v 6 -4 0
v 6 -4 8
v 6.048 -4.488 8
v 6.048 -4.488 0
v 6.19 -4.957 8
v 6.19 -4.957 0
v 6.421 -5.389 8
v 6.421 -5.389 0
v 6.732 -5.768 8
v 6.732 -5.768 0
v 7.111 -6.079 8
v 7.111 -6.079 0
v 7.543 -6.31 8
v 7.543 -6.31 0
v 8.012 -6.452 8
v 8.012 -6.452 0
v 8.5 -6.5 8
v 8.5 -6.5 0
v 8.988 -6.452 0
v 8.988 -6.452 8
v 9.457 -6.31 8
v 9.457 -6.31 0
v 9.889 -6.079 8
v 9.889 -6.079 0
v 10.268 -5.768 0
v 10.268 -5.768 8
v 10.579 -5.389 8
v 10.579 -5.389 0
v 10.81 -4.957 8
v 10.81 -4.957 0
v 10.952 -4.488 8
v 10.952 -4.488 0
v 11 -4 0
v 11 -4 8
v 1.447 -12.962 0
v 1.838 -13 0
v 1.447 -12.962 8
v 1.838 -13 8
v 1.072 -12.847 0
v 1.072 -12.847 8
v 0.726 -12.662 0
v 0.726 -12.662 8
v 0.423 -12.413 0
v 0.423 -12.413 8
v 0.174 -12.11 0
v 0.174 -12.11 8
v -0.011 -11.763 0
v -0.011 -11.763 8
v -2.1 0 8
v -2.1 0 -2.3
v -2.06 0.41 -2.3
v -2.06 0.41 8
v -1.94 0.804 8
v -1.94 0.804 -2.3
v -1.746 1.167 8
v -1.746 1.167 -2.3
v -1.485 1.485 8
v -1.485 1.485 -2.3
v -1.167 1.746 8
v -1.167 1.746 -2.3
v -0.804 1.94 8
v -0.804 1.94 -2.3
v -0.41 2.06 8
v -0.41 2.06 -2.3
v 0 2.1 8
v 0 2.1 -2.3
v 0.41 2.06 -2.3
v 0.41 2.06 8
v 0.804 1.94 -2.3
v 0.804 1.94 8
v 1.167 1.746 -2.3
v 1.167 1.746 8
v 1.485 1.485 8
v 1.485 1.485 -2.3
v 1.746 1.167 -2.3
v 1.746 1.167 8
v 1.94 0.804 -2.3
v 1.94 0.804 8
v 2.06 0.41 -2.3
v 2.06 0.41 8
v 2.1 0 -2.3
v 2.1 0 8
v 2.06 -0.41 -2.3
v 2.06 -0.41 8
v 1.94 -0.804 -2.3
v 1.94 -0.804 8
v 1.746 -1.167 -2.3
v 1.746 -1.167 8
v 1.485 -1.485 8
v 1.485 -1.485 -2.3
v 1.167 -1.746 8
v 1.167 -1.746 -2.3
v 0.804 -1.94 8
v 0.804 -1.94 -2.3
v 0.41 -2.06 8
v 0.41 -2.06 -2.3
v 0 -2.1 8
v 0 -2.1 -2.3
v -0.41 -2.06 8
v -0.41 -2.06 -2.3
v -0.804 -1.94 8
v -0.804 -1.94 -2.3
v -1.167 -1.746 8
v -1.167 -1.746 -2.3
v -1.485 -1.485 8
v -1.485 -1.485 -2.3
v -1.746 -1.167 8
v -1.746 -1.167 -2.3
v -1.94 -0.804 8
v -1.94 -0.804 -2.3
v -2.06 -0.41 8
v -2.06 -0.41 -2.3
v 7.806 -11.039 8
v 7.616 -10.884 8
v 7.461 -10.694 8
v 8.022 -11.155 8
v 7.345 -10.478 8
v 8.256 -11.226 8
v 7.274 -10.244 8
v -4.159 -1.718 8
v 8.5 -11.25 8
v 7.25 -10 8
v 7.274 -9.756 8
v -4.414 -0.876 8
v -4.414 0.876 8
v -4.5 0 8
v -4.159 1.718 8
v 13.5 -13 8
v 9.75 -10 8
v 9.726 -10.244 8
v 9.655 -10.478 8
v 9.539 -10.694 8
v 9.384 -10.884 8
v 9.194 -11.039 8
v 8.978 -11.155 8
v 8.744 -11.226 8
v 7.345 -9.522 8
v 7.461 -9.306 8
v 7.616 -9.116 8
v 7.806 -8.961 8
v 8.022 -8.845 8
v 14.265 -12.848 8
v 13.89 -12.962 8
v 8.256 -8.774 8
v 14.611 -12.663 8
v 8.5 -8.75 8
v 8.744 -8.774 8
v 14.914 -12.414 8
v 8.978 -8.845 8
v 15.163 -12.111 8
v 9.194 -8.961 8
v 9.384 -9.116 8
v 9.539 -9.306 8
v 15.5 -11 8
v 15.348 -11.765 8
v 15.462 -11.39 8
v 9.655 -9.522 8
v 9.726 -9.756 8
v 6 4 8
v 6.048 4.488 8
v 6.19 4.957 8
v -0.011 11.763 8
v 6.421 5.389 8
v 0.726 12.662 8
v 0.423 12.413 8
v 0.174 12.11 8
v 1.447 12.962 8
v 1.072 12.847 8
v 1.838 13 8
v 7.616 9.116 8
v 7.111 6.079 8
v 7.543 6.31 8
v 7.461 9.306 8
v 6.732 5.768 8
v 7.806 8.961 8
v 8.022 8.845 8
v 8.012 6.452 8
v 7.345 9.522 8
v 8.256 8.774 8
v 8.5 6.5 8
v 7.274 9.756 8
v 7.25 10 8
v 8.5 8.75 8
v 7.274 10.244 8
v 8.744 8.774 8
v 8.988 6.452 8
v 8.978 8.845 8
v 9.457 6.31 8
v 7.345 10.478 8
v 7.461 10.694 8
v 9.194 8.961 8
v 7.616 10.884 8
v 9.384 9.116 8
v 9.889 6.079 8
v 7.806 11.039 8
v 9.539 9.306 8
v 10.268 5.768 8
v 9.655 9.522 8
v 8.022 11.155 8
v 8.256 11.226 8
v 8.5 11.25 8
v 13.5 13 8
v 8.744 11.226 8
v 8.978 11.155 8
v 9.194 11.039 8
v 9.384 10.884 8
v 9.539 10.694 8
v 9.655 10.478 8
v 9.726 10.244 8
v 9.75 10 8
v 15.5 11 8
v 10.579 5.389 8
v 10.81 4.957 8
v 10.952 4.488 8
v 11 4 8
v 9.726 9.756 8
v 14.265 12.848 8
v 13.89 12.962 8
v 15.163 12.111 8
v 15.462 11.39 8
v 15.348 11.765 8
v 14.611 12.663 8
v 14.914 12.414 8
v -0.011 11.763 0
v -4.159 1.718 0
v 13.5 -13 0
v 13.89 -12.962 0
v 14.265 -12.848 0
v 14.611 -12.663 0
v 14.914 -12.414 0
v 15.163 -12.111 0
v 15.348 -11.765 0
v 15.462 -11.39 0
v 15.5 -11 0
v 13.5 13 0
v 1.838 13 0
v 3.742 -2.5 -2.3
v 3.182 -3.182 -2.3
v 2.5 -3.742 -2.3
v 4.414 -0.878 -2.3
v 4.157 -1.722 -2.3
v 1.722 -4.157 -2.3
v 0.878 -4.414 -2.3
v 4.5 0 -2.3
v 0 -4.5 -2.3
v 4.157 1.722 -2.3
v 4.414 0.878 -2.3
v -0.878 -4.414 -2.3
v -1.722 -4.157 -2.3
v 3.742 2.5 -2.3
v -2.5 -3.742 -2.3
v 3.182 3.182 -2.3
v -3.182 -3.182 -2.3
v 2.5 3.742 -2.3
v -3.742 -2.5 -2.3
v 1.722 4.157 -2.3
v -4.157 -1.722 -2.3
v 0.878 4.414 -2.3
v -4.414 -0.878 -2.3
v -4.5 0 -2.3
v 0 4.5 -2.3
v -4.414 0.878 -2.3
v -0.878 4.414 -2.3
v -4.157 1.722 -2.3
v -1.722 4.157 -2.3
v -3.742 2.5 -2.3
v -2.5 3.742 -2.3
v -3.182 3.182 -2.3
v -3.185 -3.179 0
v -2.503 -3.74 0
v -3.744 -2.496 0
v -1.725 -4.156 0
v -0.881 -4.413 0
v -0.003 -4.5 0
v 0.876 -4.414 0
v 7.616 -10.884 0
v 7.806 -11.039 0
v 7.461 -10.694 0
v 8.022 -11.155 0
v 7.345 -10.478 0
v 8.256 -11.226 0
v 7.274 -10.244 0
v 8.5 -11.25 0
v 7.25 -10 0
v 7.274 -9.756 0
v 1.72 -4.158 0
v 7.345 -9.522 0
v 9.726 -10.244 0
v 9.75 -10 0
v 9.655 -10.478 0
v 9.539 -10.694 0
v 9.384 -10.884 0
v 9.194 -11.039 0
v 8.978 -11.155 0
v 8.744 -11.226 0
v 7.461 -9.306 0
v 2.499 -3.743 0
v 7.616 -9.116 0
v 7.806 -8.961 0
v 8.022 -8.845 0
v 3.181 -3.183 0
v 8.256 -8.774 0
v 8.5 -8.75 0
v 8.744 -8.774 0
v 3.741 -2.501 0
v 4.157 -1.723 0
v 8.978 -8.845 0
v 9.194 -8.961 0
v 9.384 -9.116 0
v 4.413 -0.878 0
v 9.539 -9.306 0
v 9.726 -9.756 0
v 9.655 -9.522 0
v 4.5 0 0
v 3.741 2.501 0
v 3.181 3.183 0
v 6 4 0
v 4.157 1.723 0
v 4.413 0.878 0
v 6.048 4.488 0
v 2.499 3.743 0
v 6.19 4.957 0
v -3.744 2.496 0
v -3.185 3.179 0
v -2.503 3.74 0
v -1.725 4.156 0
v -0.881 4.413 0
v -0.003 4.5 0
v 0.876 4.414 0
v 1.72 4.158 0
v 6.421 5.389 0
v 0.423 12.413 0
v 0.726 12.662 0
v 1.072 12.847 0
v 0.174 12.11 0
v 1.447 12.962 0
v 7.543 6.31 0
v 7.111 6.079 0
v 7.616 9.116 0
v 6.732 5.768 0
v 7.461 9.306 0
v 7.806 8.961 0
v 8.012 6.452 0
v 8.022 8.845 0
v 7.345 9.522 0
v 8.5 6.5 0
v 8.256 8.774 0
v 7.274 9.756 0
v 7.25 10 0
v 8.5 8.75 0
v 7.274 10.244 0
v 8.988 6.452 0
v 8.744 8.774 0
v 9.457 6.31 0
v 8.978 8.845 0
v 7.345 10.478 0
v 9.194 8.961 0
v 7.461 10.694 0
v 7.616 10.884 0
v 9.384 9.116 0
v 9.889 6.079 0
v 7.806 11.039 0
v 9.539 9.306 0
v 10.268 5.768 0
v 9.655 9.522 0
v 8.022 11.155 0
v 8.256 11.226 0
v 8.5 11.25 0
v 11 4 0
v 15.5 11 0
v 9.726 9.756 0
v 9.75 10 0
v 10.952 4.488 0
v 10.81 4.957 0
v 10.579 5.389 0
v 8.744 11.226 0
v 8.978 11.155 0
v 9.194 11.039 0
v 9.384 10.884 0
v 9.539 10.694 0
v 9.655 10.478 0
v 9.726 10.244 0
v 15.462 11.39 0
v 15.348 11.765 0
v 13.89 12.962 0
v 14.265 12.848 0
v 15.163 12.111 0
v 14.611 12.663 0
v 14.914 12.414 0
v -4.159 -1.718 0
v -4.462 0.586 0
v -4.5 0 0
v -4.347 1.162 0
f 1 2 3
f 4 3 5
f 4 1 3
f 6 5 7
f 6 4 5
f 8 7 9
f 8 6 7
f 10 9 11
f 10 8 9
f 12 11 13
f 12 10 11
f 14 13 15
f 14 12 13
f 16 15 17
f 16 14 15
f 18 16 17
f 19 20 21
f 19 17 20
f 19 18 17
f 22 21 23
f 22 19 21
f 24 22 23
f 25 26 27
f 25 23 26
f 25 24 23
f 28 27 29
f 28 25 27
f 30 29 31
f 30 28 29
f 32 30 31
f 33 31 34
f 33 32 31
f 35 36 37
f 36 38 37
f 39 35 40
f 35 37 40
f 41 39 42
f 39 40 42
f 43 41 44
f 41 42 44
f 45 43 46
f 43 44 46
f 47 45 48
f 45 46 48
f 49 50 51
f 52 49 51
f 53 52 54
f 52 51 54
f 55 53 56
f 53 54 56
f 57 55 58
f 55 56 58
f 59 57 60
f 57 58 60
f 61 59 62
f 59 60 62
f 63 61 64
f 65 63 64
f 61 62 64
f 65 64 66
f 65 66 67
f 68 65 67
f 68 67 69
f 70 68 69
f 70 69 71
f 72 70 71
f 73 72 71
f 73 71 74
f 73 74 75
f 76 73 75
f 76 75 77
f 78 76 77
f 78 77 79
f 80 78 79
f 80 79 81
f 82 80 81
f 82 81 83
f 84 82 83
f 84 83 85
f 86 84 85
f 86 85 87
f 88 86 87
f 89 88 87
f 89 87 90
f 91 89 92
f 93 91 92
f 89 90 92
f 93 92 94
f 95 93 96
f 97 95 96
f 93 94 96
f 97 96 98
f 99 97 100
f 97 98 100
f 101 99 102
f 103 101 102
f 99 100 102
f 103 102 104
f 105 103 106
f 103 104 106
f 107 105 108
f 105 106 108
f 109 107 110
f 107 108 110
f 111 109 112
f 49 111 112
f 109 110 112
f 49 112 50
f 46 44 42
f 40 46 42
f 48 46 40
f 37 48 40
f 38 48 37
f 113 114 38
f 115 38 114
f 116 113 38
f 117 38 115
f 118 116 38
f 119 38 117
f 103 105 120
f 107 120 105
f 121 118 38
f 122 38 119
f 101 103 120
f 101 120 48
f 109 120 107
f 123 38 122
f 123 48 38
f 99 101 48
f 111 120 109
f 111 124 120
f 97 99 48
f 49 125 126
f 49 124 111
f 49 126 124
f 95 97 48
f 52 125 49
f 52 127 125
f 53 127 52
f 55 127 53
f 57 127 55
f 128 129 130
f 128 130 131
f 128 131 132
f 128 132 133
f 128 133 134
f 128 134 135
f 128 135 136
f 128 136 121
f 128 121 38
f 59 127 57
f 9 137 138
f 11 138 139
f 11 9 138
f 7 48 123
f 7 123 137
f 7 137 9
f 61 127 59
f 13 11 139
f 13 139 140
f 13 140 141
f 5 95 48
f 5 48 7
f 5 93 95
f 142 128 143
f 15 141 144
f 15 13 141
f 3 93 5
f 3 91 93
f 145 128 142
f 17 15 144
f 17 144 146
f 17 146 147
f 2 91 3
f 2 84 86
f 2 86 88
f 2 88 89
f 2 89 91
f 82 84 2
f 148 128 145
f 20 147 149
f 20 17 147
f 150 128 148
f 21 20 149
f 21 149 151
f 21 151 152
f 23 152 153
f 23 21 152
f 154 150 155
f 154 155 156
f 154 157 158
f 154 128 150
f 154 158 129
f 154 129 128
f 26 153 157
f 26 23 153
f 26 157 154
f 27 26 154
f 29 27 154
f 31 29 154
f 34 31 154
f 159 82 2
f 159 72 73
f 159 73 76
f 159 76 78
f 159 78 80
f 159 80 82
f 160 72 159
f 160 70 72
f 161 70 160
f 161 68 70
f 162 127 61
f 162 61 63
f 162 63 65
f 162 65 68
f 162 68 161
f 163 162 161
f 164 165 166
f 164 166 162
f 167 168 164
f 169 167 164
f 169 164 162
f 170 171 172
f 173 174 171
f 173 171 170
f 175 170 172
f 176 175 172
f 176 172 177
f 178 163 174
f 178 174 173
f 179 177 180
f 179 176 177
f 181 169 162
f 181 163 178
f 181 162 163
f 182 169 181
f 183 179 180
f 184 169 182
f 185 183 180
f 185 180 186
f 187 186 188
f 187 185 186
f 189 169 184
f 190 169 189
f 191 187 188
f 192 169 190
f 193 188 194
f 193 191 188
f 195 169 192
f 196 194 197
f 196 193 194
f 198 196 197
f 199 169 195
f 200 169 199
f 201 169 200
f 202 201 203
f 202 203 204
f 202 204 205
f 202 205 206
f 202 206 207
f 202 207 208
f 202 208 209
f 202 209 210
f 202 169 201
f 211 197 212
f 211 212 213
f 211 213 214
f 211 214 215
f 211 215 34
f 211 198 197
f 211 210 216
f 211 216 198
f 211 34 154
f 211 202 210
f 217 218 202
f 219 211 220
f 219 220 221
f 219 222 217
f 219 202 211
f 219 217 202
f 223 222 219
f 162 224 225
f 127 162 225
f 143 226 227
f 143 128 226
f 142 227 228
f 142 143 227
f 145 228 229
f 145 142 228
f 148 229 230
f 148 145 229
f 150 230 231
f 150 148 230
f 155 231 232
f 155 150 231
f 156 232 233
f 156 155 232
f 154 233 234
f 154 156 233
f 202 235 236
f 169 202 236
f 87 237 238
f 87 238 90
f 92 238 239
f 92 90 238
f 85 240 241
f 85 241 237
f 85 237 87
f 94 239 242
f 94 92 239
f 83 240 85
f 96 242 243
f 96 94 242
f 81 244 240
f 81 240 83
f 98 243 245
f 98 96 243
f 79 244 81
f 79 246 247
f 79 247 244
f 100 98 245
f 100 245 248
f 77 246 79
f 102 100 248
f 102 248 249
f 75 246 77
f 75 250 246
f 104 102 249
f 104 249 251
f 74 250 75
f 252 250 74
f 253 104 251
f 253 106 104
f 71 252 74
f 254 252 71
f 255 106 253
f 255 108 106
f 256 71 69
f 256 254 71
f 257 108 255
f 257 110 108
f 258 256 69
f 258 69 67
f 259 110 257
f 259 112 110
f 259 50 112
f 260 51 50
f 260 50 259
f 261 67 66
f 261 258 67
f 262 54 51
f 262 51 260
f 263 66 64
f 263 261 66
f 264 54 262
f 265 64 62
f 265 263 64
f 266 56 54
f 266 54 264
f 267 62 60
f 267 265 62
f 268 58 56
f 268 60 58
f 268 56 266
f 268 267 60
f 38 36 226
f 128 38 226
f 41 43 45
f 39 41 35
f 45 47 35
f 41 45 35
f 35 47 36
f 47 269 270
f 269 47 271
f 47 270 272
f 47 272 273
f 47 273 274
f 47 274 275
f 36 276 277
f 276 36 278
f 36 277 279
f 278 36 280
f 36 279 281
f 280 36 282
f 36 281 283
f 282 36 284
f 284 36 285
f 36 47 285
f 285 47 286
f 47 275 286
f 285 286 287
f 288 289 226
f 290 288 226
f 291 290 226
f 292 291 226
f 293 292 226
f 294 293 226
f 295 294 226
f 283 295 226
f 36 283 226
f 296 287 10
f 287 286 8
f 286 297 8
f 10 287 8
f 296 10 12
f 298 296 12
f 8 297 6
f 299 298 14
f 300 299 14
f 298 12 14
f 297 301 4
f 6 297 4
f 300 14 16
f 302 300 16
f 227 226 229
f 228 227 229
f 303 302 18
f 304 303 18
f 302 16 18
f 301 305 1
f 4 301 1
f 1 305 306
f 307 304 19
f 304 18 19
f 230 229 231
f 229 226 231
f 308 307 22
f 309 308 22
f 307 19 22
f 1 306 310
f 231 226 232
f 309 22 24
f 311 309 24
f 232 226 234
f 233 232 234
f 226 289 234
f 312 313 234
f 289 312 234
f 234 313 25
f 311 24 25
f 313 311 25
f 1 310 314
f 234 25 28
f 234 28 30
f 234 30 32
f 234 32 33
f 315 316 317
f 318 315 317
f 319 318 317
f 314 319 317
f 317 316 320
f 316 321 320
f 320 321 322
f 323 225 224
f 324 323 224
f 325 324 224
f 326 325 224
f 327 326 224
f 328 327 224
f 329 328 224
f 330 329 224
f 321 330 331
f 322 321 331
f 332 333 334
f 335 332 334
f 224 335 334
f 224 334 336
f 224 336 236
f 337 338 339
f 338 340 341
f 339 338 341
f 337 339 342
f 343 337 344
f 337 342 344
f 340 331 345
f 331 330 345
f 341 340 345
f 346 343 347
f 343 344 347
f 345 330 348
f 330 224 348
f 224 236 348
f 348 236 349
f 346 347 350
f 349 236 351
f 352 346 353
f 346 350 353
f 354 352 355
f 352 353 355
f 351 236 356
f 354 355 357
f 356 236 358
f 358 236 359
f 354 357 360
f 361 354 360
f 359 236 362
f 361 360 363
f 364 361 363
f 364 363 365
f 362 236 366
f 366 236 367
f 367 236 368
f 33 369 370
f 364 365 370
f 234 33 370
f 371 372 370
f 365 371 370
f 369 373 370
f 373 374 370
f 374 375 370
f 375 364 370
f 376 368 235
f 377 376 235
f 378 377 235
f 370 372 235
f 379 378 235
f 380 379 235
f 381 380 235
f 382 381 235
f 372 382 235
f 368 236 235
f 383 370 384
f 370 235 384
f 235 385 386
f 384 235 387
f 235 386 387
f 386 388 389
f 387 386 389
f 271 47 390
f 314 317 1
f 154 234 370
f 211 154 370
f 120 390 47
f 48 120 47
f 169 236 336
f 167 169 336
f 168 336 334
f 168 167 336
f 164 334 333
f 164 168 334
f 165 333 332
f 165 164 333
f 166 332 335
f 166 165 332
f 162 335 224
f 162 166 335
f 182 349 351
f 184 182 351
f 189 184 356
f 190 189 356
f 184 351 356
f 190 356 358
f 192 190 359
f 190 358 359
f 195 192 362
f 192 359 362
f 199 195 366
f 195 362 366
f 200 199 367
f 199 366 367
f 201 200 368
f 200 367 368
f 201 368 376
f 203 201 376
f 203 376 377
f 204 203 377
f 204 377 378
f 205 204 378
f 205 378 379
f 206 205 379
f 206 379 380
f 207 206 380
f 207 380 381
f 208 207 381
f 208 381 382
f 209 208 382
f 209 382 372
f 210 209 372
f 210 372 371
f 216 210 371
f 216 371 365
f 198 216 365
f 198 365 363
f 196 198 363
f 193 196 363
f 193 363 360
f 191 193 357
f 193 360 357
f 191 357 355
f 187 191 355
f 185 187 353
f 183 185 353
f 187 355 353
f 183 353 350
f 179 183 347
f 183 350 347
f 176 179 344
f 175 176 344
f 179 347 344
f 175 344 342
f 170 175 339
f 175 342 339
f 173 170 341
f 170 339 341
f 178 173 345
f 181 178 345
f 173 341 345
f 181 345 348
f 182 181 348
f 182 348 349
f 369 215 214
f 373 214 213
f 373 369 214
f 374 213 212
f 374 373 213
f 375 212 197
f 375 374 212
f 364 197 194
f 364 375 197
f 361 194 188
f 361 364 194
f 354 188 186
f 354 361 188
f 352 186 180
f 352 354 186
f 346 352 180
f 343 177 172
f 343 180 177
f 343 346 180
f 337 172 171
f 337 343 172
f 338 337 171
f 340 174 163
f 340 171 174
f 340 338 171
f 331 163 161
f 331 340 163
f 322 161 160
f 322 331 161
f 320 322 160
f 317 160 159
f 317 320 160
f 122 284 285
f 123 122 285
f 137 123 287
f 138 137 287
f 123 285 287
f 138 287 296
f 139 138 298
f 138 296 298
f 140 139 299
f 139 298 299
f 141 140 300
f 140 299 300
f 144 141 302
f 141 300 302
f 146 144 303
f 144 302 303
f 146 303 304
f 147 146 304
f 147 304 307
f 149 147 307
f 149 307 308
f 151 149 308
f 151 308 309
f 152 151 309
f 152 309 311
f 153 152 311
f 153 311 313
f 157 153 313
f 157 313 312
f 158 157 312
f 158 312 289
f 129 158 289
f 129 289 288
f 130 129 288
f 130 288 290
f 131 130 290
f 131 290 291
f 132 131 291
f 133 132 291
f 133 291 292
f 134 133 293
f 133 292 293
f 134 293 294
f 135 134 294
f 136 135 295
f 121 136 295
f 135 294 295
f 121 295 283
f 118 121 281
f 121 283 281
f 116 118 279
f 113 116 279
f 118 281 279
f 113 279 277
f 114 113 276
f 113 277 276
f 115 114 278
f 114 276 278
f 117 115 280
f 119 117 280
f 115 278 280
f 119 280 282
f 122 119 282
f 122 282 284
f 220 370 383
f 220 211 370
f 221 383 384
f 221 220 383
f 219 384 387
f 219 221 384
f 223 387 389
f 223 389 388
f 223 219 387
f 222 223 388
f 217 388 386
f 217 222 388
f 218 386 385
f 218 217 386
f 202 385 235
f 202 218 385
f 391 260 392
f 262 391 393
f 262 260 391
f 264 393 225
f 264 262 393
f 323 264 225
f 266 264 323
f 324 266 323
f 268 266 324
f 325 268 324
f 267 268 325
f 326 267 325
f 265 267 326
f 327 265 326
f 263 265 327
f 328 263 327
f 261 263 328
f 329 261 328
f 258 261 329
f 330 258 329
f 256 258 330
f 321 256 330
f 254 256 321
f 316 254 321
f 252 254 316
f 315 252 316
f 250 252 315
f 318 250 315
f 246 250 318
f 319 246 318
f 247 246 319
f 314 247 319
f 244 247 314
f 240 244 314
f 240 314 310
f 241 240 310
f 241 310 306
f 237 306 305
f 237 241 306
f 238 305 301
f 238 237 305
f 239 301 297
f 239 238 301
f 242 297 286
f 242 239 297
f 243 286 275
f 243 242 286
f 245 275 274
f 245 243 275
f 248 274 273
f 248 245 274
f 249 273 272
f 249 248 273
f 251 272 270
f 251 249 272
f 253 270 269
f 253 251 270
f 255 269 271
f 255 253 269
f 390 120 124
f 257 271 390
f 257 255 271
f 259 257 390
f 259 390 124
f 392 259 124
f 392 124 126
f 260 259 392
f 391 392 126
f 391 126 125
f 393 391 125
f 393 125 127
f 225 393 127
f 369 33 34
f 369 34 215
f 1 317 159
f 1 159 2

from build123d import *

# Parameters (mm, degrees)
SKETCH_1_R             = 1.5
EXTRUDE_1_DEPTH        = 8
SKETCH_2_R             = 1
CUT_EXTRUDE_1_DEPTH    = 33
FILLET_1_R             = 2
HOLE_WIZARD_M3_1_D     = 2.5
EXTRUDE_START          = 2.3
SKETCH_8_R             = 4.5
SKETCH_8_R_2           = 1.5
EXTRUDE_2_DEPTH        = 2.3
HOLE_WIZARD_M5_1_D     = 4.2
HOLE_WIZARD_M5_1_DEPTH = 20
HOLE_WIZARD_M5_1_TIP   = 1.2618073
CUT_EXTRUDE_2_DEPTH    = 20


with BuildPart() as part:
    # 草图1 → 凸台-拉伸1 (new body)
    with BuildSketch(Plane.XY):
        with BuildLine():
            Line((0.5, -13), (15.5, -13))
            Line((15.5, -13), (15.5, 13))
            Line((15.5, 13), (0.5, 13))
            Line((0.5, 13), (-4.159282148, 1.717664698))
            ThreePointArc((-4.159282148, 1.717664698), (-4.5, 0), (-4.159282148, -1.717664698))
            Line((-4.159282148, -1.717664698), (0.5, -13))
        make_face()
        Circle(SKETCH_1_R, mode=Mode.SUBTRACT)
    extrude(amount=EXTRUDE_1_DEPTH)

    # 草图2 → 切除-拉伸1 (cut)
    with BuildSketch(Plane.XY.offset(8)):
        with Locations((8.5, 10)):
            Circle(SKETCH_2_R)
        with Locations((8.5, -10)):
            Circle(SKETCH_2_R)
    extrude(amount=-CUT_EXTRUDE_1_DEPTH, mode=Mode.SUBTRACT)

    # 圆角1
    fillet_1_edges = [part.edges().sort_by_distance(p)[0] for p in [
        (0.5, 13, 4),
        (15.5, 13, 4),
        (15.5, -13, 4),
        (0.5, -13, 4),
    ]]
    fillet(fillet_1_edges, radius=FILLET_1_R)

    # M3 螺纹孔1 (through all)
    with Locations(Plane.XY.offset(8)):
        with Locations((8.5, 10), (8.5, -10)):
            Hole(HOLE_WIZARD_M3_1_D / 2)

    # 草图8 → 凸台-拉伸2 (add)
    with BuildSketch(Plane(origin=(0, 0, 0), x_dir=(-1, 0, 0), z_dir=(0, 0, -1)).offset(EXTRUDE_START)):
        Circle(SKETCH_8_R)
        Circle(SKETCH_8_R_2, mode=Mode.SUBTRACT)
    extrude(amount=-EXTRUDE_2_DEPTH)

    # M5 螺纹孔1
    with Locations(Plane.XY.offset(8)):
        with Locations((0, 0)):
            Hole(HOLE_WIZARD_M5_1_D / 2, depth=HOLE_WIZARD_M5_1_DEPTH)
            with Locations((0, 0, -(HOLE_WIZARD_M5_1_DEPTH + HOLE_WIZARD_M5_1_TIP / 2))):  # 118° drill point
                Cone(0, HOLE_WIZARD_M5_1_D / 2, HOLE_WIZARD_M5_1_TIP, mode=Mode.SUBTRACT)

    # 草图12 → 切除-拉伸2 (cut)
    with BuildSketch(Plane(origin=(0, 0, 0), x_dir=(-1, 0, 0), z_dir=(0, 0, -1))):
        with BuildLine():
            Line((-6, 4), (-6, -4))
            ThreePointArc((-6, -4), (-8.5, -6.5), (-11, -4))
            Line((-11, -4), (-11, 4))
            ThreePointArc((-11, 4), (-8.5, 6.5), (-6, 4))
        make_face()
    extrude(amount=-CUT_EXTRUDE_2_DEPTH, mode=Mode.SUBTRACT)


solid = part.part
